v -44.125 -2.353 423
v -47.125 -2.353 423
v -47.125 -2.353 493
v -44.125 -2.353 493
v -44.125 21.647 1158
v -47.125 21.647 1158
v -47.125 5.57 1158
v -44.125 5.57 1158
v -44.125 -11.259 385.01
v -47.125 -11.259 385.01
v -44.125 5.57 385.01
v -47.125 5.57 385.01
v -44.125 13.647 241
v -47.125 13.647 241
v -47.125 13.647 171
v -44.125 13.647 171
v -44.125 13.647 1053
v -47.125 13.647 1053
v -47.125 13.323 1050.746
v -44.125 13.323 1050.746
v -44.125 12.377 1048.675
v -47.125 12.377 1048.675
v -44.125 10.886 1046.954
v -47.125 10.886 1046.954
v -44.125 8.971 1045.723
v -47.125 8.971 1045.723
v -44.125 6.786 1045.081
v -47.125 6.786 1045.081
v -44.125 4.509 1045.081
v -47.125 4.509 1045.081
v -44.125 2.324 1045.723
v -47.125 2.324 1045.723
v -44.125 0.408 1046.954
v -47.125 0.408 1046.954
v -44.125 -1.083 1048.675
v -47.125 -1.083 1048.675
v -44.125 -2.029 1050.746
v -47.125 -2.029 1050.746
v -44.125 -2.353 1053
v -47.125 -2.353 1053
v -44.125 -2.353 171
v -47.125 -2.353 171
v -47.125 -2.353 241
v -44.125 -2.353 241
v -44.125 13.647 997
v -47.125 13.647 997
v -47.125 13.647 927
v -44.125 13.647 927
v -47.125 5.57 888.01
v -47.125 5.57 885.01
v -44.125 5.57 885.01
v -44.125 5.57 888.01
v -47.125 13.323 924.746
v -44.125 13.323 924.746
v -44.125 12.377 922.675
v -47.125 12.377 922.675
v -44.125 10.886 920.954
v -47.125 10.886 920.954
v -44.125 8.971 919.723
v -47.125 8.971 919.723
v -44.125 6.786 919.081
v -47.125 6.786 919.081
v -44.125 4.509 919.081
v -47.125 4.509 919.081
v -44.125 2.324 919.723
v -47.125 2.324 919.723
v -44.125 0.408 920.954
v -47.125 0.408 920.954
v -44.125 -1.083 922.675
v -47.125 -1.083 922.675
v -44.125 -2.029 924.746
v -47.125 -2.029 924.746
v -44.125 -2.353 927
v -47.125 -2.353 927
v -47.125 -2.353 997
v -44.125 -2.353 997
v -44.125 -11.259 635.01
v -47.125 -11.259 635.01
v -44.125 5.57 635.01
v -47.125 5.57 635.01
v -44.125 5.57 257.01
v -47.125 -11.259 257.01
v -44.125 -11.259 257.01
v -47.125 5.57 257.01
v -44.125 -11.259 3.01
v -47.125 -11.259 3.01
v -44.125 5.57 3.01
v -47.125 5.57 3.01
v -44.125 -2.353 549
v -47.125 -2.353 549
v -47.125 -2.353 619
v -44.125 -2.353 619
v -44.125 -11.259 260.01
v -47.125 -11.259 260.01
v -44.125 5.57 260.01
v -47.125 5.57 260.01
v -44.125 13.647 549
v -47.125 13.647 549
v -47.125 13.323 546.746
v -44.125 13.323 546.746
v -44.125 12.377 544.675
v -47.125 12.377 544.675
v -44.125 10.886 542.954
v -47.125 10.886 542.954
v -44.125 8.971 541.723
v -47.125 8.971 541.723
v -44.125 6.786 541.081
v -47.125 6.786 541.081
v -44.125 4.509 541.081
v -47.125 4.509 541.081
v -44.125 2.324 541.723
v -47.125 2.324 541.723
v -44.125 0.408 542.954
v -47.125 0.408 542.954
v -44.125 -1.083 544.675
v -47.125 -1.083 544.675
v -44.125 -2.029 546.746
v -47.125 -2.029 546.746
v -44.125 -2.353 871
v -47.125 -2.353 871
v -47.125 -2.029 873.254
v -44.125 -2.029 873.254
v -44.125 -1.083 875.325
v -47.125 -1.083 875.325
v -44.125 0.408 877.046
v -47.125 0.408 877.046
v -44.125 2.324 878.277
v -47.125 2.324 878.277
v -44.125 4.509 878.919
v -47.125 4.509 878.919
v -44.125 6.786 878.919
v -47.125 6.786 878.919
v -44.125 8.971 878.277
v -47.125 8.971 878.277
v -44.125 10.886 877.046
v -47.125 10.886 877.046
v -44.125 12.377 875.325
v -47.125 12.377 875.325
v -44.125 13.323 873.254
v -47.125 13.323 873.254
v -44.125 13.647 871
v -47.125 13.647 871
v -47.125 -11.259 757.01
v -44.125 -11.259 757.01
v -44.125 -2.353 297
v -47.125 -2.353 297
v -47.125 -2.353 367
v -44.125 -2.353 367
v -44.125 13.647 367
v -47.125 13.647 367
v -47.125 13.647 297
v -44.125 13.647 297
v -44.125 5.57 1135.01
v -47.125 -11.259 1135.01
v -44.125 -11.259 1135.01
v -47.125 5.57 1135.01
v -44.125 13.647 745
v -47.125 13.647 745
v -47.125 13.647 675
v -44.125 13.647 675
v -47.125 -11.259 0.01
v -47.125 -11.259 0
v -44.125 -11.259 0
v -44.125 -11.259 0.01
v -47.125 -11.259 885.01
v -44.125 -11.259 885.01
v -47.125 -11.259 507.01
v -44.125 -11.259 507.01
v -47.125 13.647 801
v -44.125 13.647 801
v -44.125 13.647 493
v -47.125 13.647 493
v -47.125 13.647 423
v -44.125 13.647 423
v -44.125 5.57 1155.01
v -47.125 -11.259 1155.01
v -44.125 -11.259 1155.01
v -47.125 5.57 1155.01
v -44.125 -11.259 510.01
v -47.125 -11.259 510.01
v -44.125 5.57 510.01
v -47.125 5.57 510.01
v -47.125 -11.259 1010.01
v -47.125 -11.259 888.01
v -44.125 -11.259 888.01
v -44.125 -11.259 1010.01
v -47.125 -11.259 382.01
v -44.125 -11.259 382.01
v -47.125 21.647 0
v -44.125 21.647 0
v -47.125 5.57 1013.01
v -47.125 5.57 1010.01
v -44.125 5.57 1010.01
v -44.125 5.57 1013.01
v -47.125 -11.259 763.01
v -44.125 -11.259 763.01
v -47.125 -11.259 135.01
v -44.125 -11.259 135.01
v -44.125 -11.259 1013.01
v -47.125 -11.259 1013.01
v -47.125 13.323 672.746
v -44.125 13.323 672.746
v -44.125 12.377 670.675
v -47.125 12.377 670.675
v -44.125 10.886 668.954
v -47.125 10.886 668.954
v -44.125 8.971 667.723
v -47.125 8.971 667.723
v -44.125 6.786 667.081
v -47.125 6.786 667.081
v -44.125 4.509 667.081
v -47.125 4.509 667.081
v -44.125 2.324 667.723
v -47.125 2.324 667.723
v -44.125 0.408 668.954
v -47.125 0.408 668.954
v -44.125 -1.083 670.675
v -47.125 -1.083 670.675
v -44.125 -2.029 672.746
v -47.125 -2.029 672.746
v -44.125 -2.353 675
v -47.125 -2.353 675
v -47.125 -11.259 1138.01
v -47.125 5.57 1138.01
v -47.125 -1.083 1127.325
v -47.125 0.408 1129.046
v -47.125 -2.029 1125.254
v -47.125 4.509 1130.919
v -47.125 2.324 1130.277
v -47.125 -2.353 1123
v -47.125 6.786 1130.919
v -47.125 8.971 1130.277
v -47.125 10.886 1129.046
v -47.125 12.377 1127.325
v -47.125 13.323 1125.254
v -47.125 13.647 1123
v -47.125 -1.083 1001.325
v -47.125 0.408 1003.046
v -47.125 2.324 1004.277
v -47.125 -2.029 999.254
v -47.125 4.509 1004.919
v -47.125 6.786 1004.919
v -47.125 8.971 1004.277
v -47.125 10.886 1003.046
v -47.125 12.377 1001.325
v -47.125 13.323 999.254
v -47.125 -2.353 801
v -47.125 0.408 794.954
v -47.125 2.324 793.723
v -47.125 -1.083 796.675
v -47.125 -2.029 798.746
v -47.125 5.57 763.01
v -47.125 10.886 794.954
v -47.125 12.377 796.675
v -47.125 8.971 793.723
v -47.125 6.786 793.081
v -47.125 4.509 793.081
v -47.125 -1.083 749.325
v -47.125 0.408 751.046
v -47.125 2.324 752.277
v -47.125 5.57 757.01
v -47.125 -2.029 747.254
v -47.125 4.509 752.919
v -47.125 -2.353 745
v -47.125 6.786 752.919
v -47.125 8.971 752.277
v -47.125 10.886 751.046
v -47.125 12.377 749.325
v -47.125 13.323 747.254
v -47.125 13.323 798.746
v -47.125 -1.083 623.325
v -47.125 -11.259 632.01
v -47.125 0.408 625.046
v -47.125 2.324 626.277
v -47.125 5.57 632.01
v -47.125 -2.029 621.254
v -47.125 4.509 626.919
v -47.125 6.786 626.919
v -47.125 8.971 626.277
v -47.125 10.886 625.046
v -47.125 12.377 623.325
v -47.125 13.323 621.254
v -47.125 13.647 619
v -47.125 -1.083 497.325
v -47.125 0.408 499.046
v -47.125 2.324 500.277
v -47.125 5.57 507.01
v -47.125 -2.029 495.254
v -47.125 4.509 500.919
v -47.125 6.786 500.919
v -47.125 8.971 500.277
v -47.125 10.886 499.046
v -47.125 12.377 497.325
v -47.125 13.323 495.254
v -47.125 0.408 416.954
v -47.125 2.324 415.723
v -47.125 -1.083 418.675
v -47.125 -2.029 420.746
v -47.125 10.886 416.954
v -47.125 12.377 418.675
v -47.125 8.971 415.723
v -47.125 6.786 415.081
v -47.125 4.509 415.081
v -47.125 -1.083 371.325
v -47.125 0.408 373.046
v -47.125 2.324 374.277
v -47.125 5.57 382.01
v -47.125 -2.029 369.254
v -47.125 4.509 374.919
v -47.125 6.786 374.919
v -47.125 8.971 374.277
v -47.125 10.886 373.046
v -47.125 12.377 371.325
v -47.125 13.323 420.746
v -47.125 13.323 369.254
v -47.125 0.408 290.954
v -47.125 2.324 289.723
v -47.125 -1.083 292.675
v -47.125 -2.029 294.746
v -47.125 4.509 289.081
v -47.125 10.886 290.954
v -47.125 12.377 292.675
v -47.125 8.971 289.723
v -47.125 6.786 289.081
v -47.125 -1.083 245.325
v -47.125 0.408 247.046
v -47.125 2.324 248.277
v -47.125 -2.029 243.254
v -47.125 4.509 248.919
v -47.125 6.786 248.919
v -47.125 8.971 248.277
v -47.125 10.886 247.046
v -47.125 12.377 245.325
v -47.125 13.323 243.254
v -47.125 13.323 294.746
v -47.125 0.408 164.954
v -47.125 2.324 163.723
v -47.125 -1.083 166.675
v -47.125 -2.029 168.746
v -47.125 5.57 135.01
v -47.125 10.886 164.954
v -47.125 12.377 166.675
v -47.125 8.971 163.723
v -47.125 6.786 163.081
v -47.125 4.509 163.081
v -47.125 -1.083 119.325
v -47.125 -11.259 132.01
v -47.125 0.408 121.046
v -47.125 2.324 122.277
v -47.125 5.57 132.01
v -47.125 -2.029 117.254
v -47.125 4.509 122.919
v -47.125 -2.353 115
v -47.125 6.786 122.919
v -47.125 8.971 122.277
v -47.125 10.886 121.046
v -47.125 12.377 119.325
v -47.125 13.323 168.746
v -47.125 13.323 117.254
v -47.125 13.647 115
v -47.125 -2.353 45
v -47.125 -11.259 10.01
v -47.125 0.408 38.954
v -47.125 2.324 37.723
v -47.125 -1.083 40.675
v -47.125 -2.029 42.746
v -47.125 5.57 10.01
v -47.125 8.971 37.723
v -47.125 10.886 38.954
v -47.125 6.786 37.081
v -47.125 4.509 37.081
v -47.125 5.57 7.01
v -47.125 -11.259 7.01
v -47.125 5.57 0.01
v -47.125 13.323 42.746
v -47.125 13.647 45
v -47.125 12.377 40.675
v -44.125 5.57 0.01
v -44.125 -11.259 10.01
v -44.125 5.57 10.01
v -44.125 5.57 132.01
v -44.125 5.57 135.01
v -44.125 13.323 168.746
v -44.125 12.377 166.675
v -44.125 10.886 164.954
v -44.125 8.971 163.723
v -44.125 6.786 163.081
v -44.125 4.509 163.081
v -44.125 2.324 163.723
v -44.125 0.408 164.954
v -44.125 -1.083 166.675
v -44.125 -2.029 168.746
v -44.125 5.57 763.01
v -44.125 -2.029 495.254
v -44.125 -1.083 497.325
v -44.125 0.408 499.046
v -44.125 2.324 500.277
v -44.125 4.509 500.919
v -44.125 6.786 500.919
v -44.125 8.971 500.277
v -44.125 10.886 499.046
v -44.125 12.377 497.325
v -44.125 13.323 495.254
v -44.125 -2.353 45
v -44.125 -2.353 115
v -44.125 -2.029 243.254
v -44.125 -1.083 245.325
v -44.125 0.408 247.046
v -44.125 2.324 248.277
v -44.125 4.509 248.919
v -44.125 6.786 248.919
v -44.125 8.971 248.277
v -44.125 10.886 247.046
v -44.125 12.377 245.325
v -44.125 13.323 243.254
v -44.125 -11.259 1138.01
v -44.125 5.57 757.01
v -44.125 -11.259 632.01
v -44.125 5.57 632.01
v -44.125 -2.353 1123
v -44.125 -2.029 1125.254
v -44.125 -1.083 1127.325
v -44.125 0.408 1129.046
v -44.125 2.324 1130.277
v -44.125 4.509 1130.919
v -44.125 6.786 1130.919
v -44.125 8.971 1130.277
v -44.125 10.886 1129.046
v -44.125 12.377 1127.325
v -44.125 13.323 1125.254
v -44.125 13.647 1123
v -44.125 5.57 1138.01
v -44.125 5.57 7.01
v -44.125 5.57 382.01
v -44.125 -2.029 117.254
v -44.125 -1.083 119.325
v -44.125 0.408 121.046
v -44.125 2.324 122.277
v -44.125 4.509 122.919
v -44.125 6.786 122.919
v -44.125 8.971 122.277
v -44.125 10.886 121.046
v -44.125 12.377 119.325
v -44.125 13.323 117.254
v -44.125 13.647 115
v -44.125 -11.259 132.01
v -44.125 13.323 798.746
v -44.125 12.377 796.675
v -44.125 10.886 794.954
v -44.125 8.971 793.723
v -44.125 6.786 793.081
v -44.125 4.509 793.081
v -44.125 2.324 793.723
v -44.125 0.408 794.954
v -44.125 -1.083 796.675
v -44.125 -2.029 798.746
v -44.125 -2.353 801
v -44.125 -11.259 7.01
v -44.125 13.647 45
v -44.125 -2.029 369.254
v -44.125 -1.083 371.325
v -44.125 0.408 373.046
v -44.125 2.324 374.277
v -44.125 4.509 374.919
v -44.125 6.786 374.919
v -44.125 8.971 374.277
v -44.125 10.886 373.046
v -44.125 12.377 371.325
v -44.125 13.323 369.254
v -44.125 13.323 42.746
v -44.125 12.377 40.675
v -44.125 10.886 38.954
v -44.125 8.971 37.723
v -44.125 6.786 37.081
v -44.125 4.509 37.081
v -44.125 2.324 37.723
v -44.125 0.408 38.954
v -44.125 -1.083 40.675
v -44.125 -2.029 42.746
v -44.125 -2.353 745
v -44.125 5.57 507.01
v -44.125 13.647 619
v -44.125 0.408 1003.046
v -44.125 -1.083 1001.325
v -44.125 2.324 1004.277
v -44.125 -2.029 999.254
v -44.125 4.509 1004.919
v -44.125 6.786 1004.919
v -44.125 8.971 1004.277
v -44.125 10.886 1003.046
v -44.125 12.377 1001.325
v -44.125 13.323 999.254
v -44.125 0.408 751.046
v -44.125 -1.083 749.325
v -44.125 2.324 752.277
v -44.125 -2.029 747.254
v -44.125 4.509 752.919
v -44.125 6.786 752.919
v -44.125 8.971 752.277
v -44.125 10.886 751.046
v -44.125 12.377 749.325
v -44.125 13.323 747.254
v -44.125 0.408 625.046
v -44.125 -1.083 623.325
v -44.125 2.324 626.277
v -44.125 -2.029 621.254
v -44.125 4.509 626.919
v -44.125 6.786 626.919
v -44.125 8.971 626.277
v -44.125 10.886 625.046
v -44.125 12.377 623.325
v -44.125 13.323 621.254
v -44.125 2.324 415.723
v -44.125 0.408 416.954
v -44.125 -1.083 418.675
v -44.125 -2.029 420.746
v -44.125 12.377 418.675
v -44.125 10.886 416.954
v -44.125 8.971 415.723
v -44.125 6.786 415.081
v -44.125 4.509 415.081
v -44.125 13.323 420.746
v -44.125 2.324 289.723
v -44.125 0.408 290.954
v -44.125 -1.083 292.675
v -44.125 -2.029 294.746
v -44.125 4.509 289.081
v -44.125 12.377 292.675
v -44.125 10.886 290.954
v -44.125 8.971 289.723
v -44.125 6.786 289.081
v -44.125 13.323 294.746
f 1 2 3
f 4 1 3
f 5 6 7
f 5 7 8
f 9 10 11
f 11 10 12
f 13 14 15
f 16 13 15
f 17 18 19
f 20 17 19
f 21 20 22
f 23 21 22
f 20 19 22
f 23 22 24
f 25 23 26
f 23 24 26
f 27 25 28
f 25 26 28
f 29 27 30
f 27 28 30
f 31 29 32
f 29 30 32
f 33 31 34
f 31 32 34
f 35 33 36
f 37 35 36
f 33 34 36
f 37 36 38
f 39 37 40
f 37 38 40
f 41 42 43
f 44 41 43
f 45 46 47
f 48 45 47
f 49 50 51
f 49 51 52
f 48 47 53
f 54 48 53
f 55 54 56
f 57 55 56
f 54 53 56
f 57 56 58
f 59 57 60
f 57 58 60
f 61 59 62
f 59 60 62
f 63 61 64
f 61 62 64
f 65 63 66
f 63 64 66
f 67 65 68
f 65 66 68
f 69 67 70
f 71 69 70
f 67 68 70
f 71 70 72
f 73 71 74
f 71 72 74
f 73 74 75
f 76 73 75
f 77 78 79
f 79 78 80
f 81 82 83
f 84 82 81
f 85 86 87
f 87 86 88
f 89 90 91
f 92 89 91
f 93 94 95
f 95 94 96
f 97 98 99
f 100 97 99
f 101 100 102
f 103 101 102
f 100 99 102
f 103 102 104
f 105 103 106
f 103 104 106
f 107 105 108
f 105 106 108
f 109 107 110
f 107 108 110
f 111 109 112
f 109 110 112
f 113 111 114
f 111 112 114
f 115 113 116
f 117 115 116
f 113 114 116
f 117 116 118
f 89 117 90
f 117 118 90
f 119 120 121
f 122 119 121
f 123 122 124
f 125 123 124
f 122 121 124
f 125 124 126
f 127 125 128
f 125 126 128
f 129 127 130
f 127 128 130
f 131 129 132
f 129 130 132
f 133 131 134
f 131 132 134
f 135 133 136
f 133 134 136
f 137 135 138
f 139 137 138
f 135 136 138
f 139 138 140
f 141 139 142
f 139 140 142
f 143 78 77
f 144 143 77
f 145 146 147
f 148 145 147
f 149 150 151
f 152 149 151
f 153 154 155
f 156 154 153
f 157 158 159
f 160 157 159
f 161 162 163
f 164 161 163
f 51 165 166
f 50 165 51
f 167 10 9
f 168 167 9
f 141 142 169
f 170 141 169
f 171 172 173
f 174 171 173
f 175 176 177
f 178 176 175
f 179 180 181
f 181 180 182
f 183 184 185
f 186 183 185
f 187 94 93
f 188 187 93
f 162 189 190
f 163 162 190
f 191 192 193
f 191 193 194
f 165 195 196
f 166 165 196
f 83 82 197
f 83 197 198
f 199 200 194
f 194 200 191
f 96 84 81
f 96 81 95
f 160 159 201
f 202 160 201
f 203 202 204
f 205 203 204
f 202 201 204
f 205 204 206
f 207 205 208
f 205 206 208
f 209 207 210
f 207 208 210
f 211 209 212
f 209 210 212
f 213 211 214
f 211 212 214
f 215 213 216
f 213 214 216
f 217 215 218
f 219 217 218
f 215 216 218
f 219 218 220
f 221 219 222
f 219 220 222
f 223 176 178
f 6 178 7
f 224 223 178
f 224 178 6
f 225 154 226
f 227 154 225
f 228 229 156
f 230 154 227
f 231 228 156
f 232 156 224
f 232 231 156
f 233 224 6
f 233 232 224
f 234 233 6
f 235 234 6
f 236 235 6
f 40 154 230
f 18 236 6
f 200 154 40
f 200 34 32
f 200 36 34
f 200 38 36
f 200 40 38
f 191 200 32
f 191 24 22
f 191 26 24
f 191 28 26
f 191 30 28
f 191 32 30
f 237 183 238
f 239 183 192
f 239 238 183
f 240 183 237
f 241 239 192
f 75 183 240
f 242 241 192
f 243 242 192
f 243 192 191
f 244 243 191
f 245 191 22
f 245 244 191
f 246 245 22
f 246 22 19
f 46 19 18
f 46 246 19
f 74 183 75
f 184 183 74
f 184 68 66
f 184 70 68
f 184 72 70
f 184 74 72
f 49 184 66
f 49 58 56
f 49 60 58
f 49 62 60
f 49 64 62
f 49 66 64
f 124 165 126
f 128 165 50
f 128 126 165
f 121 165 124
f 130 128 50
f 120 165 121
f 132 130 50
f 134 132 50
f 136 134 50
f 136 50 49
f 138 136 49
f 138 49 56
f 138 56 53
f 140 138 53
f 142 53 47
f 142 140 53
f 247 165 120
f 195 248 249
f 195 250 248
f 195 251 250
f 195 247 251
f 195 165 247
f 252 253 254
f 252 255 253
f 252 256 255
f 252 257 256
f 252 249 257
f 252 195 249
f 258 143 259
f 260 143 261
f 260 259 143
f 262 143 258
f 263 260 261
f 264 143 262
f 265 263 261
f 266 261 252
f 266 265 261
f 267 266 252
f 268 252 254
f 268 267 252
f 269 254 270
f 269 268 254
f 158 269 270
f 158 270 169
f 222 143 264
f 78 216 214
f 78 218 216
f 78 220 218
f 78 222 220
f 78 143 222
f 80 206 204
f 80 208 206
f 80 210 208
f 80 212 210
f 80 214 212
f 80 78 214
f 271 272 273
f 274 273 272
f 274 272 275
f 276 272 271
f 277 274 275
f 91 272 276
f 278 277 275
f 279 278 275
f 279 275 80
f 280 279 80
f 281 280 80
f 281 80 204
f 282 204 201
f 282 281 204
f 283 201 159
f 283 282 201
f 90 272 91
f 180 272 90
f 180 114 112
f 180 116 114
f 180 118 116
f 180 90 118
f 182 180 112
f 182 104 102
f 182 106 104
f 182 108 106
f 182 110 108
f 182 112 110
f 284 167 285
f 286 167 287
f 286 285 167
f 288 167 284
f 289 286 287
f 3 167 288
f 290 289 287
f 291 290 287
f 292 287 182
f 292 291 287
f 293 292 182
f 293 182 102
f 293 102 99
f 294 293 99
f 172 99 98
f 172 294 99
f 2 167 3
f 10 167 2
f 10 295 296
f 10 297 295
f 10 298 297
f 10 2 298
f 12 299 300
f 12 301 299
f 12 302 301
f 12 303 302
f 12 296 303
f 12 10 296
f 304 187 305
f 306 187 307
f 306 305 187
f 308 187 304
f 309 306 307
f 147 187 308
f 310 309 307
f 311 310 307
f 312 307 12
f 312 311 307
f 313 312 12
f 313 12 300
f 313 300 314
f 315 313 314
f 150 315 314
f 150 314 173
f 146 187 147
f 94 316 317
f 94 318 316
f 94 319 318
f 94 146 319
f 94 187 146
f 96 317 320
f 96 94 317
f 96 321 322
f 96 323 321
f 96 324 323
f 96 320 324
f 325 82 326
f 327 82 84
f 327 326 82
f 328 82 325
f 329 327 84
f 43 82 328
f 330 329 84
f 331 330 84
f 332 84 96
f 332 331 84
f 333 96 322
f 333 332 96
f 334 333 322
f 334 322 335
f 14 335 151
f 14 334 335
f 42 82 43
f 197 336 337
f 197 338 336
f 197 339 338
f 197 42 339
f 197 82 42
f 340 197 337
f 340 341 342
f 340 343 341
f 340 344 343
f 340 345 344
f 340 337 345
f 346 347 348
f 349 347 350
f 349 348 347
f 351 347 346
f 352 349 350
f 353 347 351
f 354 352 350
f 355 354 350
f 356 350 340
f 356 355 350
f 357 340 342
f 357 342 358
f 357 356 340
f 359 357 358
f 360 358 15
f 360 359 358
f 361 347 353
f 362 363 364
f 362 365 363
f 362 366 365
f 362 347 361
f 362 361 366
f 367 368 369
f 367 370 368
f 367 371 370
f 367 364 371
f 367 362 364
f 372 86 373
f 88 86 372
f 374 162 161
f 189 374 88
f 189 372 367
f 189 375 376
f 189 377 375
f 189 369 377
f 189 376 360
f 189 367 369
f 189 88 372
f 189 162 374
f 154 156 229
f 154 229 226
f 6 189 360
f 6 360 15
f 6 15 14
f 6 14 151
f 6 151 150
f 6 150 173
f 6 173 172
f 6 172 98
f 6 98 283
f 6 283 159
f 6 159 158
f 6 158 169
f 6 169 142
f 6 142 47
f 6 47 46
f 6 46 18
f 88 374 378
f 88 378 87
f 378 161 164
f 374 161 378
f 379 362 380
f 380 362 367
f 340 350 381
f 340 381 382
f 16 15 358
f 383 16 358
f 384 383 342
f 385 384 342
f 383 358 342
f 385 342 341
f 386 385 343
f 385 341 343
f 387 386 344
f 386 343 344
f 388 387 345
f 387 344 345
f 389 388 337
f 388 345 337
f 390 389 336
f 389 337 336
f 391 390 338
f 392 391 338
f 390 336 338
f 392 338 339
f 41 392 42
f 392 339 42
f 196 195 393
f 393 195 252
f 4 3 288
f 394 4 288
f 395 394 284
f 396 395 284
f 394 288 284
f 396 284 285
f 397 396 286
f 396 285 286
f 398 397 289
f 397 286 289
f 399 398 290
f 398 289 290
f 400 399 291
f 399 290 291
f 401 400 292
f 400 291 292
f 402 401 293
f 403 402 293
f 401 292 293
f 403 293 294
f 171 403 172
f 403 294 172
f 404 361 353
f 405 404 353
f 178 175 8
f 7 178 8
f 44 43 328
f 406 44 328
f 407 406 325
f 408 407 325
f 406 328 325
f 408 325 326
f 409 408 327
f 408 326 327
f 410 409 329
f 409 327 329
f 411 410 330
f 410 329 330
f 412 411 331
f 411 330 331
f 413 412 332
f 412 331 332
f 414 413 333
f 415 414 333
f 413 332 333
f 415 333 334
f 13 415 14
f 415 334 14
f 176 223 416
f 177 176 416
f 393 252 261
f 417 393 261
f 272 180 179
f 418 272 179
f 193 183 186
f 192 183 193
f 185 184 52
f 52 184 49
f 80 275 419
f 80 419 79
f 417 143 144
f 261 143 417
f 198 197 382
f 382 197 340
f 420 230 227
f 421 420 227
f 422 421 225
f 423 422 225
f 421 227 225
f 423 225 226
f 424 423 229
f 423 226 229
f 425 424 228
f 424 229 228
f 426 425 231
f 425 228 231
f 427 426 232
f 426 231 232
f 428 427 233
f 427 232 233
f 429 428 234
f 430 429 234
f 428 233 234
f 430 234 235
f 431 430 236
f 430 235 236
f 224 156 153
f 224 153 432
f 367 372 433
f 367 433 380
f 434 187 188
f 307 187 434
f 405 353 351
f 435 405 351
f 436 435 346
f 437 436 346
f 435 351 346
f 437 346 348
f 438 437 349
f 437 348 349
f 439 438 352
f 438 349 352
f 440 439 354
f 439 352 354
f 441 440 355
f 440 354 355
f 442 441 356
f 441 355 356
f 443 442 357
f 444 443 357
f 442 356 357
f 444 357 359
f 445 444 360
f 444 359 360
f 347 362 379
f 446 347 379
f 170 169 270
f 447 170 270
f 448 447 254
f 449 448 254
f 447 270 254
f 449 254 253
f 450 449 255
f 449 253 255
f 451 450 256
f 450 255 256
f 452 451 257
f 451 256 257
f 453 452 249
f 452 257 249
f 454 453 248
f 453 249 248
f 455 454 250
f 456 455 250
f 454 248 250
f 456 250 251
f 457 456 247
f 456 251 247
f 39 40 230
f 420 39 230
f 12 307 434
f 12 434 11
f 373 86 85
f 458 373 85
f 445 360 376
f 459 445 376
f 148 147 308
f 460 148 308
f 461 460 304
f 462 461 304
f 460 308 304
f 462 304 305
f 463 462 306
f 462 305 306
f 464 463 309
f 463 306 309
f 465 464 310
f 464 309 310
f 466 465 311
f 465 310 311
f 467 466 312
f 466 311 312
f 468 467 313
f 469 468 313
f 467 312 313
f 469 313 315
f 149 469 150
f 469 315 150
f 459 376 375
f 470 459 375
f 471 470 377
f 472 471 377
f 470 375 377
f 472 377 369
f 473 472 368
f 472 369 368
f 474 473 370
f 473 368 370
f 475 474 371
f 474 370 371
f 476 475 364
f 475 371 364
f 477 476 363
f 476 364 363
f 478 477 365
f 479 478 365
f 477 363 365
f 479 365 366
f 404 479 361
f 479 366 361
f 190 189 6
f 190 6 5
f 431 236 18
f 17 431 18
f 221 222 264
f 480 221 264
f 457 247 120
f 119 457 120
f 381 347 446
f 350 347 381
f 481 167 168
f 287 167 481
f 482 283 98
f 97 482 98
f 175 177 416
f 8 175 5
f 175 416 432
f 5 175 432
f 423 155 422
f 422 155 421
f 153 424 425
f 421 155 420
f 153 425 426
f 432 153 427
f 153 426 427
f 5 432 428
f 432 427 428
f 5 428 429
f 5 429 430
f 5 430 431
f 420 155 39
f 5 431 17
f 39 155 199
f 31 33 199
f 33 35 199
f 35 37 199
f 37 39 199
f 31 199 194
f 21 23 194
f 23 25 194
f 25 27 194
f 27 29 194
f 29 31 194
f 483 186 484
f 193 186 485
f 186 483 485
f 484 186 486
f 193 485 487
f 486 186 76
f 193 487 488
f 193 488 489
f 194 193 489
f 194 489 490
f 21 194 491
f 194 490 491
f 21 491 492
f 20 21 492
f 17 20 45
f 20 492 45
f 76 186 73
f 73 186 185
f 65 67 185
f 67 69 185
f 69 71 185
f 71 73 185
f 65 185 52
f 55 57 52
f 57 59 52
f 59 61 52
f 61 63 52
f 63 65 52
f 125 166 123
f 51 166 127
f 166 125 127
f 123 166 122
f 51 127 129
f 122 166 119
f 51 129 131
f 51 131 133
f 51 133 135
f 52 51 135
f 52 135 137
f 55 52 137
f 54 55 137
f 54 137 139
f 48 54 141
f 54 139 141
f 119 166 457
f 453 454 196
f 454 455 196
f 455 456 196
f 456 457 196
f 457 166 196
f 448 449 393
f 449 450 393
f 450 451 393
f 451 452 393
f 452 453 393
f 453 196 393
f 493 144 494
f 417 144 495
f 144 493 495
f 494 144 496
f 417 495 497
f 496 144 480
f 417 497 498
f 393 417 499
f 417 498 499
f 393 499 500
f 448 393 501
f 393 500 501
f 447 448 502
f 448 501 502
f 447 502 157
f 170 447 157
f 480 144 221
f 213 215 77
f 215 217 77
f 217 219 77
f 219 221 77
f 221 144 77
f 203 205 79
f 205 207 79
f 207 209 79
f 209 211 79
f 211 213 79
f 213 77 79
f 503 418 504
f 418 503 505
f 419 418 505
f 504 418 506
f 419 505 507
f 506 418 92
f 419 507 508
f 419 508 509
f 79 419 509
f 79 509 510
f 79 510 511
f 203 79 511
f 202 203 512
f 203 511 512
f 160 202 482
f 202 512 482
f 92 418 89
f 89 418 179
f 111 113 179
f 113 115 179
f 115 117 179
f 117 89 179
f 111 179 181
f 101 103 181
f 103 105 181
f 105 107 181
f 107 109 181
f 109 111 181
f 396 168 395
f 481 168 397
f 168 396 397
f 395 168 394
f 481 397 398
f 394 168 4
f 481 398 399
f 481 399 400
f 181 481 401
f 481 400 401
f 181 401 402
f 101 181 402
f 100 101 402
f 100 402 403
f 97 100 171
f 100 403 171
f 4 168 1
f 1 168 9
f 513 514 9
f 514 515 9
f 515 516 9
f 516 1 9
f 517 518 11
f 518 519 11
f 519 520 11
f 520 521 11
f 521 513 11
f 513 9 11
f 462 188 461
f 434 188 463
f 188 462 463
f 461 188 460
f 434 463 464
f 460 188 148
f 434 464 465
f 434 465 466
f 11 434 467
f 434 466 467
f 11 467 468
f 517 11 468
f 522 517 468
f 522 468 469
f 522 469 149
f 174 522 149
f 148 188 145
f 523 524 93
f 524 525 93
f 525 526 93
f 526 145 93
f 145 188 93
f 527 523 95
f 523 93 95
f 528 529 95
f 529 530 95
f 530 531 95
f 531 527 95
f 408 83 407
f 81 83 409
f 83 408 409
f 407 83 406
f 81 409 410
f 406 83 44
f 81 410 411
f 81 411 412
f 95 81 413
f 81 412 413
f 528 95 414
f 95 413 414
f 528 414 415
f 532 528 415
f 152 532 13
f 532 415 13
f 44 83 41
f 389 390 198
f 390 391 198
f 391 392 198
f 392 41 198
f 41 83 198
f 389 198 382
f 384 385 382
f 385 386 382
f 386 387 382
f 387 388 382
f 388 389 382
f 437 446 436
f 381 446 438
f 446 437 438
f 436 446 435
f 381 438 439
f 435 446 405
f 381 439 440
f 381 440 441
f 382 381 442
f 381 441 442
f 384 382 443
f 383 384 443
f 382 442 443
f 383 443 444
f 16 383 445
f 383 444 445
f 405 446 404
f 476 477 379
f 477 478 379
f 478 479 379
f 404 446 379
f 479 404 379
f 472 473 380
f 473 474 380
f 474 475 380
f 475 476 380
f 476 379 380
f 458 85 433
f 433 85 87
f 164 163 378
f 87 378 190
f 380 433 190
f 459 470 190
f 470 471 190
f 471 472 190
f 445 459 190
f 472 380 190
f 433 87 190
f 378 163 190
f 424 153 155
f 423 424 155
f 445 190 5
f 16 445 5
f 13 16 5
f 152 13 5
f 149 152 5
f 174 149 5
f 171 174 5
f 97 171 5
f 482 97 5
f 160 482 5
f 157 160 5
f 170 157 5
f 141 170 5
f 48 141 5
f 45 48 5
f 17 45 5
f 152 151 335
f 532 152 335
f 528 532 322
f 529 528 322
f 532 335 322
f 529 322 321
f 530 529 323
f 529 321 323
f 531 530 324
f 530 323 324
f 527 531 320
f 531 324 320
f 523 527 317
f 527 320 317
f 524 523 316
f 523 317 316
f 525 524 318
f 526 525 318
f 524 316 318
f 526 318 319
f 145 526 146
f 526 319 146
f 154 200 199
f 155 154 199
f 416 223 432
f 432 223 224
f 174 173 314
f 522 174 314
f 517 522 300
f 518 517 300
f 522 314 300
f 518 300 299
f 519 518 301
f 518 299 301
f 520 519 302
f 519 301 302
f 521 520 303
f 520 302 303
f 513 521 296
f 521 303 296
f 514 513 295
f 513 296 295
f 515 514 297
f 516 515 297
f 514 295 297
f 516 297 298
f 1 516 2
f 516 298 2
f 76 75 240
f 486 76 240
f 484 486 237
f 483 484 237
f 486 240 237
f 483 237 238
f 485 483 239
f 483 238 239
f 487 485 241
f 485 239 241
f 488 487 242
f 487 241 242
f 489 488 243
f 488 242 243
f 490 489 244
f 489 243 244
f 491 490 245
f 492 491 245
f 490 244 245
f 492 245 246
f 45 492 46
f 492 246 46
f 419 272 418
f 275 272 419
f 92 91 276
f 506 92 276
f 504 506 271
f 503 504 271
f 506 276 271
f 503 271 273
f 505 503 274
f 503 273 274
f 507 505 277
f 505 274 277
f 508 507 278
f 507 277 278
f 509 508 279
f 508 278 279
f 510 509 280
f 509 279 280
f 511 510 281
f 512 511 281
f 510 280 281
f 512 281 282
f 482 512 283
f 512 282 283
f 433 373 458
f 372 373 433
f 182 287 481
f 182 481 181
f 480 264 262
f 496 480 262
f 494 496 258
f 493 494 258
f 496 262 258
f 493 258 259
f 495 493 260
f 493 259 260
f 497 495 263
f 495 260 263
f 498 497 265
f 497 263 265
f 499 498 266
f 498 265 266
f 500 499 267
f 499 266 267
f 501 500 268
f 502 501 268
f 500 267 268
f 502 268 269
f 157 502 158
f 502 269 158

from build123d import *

# Parameters (mm, degrees)
SKETCH_1_W          = 3
SKETCH_1_H          = 32.905807398
EXTRUDE_1_DEPTH     = 1158
SKETCH_2_W          = 3
SKETCH_2_H          = 16.828171787
SKETCH_2_W_2        = 2.99
CUT_EXTRUDE_1_DEPTH = 3


with BuildPart() as part:
    # 草图1 → 凸台-拉伸1 (new body)
    with BuildSketch(Plane.XY):
        with Locations((-45.625456821, 5.194351007)):
            Rectangle(SKETCH_1_W, SKETCH_1_H)
    extrude(amount=EXTRUDE_1_DEPTH)

    # 草图2 → 切除-拉伸1 (cut)
    with BuildSketch(Plane.ZY.offset(47.125456821)):
        with Locations((1.51, -2.844466799)):
            Rectangle(SKETCH_2_W, SKETCH_2_H)
        with Locations((8.51, -2.844466799)):
            Rectangle(SKETCH_2_W, SKETCH_2_H)
        with BuildLine():
            Line((45, -2.352745294), (115, -2.352745294))
            ThreePointArc((115, -2.352745294), (123, 5.647254706), (115, 13.647254706))
            Line((115, 13.647254706), (45, 13.647254706))
            ThreePointArc((45, 13.647254706), (37, 5.647254706), (45, -2.352745294))
        make_face()
        with Locations((133.51, -2.844466799)):
            Rectangle(SKETCH_2_W, SKETCH_2_H)
        with BuildLine():
            Line((171, -2.352745294), (241, -2.352745294))
            ThreePointArc((241, -2.352745294), (249, 5.647254706), (241, 13.647254706))
            Line((241, 13.647254706), (171, 13.647254706))
            ThreePointArc((171, 13.647254706), (163, 5.647254706), (171, -2.352745294))
        make_face()
        with Locations((258.51, -2.844466799)):
            Rectangle(SKETCH_2_W, SKETCH_2_H)
        with BuildLine():
            Line((297, -2.352745294), (367, -2.352745294))
            ThreePointArc((367, -2.352745294), (375, 5.647254706), (367, 13.647254706))
            Line((367, 13.647254706), (297, 13.647254706))
            ThreePointArc((297, 13.647254706), (289, 5.647254706), (297, -2.352745294))
        make_face()
        with Locations((383.51, -2.844466799)):
            Rectangle(SKETCH_2_W, SKETCH_2_H)
        with BuildLine():
            Line((423, -2.352745294), (493, -2.352745294))
            ThreePointArc((493, -2.352745294), (501, 5.647254706), (493, 13.647254706))
            Line((493, 13.647254706), (423, 13.647254706))
            ThreePointArc((423, 13.647254706), (415, 5.647254706), (423, -2.352745294))
        make_face()
        with Locations((508.51, -2.844466799)):
            Rectangle(SKETCH_2_W, SKETCH_2_H)
        with BuildLine():
            Line((549, -2.352745294), (619, -2.352745294))
            ThreePointArc((619, -2.352745294), (627, 5.647254706), (619, 13.647254706))
            Line((619, 13.647254706), (549, 13.647254706))
            ThreePointArc((549, 13.647254706), (541, 5.647254706), (549, -2.352745294))
        make_face()
        with Locations((633.51, -2.844466799)):
            Rectangle(SKETCH_2_W, SKETCH_2_H)
        with BuildLine():
            Line((675, -2.352745294), (745, -2.352745294))
            ThreePointArc((745, -2.352745294), (753, 5.647254706), (745, 13.647254706))
            Line((745, 13.647254706), (675, 13.647254706))
            ThreePointArc((675, 13.647254706), (667, 5.647254706), (675, -2.352745294))
        make_face()
        with Locations((758.51, -2.844466799)):
            Rectangle(SKETCH_2_W, SKETCH_2_H)
        with Locations((761.51, -2.844466799)):
            Rectangle(SKETCH_2_W, SKETCH_2_H)
        with BuildLine():
            Line((801, -2.352745294), (871, -2.352745294))
            ThreePointArc((871, -2.352745294), (879, 5.647254706), (871, 13.647254706))
            Line((871, 13.647254706), (801, 13.647254706))
            ThreePointArc((801, 13.647254706), (793, 5.647254706), (801, -2.352745294))
        make_face()
        with Locations((886.51, -2.844466799)):
            Rectangle(SKETCH_2_W, SKETCH_2_H)
        with BuildLine():
            Line((927, -2.352745294), (997, -2.352745294))
            ThreePointArc((997, -2.352745294), (1005, 5.647254706), (997, 13.647254706))
            Line((997, 13.647254706), (927, 13.647254706))
            ThreePointArc((927, 13.647254706), (919, 5.647254706), (927, -2.352745294))
        make_face()
        with Locations((1011.51, -2.844466799)):
            Rectangle(SKETCH_2_W, SKETCH_2_H)
        with BuildLine():
            Line((1053, -2.352745294), (1123, -2.352745294))
            ThreePointArc((1123, -2.352745294), (1131, 5.647254706), (1123, 13.647254706))
            Line((1123, 13.647254706), (1053, 13.647254706))
            ThreePointArc((1053, 13.647254706), (1045, 5.647254706), (1053, -2.352745294))
        make_face()
        with Locations((1136.51, -2.844466799)):
            Rectangle(SKETCH_2_W, SKETCH_2_H)
        with Locations((1156.505, -2.844466799)):
            Rectangle(SKETCH_2_W_2, SKETCH_2_H)
    extrude(amount=-CUT_EXTRUDE_1_DEPTH, mode=Mode.SUBTRACT)


solid = part.part
